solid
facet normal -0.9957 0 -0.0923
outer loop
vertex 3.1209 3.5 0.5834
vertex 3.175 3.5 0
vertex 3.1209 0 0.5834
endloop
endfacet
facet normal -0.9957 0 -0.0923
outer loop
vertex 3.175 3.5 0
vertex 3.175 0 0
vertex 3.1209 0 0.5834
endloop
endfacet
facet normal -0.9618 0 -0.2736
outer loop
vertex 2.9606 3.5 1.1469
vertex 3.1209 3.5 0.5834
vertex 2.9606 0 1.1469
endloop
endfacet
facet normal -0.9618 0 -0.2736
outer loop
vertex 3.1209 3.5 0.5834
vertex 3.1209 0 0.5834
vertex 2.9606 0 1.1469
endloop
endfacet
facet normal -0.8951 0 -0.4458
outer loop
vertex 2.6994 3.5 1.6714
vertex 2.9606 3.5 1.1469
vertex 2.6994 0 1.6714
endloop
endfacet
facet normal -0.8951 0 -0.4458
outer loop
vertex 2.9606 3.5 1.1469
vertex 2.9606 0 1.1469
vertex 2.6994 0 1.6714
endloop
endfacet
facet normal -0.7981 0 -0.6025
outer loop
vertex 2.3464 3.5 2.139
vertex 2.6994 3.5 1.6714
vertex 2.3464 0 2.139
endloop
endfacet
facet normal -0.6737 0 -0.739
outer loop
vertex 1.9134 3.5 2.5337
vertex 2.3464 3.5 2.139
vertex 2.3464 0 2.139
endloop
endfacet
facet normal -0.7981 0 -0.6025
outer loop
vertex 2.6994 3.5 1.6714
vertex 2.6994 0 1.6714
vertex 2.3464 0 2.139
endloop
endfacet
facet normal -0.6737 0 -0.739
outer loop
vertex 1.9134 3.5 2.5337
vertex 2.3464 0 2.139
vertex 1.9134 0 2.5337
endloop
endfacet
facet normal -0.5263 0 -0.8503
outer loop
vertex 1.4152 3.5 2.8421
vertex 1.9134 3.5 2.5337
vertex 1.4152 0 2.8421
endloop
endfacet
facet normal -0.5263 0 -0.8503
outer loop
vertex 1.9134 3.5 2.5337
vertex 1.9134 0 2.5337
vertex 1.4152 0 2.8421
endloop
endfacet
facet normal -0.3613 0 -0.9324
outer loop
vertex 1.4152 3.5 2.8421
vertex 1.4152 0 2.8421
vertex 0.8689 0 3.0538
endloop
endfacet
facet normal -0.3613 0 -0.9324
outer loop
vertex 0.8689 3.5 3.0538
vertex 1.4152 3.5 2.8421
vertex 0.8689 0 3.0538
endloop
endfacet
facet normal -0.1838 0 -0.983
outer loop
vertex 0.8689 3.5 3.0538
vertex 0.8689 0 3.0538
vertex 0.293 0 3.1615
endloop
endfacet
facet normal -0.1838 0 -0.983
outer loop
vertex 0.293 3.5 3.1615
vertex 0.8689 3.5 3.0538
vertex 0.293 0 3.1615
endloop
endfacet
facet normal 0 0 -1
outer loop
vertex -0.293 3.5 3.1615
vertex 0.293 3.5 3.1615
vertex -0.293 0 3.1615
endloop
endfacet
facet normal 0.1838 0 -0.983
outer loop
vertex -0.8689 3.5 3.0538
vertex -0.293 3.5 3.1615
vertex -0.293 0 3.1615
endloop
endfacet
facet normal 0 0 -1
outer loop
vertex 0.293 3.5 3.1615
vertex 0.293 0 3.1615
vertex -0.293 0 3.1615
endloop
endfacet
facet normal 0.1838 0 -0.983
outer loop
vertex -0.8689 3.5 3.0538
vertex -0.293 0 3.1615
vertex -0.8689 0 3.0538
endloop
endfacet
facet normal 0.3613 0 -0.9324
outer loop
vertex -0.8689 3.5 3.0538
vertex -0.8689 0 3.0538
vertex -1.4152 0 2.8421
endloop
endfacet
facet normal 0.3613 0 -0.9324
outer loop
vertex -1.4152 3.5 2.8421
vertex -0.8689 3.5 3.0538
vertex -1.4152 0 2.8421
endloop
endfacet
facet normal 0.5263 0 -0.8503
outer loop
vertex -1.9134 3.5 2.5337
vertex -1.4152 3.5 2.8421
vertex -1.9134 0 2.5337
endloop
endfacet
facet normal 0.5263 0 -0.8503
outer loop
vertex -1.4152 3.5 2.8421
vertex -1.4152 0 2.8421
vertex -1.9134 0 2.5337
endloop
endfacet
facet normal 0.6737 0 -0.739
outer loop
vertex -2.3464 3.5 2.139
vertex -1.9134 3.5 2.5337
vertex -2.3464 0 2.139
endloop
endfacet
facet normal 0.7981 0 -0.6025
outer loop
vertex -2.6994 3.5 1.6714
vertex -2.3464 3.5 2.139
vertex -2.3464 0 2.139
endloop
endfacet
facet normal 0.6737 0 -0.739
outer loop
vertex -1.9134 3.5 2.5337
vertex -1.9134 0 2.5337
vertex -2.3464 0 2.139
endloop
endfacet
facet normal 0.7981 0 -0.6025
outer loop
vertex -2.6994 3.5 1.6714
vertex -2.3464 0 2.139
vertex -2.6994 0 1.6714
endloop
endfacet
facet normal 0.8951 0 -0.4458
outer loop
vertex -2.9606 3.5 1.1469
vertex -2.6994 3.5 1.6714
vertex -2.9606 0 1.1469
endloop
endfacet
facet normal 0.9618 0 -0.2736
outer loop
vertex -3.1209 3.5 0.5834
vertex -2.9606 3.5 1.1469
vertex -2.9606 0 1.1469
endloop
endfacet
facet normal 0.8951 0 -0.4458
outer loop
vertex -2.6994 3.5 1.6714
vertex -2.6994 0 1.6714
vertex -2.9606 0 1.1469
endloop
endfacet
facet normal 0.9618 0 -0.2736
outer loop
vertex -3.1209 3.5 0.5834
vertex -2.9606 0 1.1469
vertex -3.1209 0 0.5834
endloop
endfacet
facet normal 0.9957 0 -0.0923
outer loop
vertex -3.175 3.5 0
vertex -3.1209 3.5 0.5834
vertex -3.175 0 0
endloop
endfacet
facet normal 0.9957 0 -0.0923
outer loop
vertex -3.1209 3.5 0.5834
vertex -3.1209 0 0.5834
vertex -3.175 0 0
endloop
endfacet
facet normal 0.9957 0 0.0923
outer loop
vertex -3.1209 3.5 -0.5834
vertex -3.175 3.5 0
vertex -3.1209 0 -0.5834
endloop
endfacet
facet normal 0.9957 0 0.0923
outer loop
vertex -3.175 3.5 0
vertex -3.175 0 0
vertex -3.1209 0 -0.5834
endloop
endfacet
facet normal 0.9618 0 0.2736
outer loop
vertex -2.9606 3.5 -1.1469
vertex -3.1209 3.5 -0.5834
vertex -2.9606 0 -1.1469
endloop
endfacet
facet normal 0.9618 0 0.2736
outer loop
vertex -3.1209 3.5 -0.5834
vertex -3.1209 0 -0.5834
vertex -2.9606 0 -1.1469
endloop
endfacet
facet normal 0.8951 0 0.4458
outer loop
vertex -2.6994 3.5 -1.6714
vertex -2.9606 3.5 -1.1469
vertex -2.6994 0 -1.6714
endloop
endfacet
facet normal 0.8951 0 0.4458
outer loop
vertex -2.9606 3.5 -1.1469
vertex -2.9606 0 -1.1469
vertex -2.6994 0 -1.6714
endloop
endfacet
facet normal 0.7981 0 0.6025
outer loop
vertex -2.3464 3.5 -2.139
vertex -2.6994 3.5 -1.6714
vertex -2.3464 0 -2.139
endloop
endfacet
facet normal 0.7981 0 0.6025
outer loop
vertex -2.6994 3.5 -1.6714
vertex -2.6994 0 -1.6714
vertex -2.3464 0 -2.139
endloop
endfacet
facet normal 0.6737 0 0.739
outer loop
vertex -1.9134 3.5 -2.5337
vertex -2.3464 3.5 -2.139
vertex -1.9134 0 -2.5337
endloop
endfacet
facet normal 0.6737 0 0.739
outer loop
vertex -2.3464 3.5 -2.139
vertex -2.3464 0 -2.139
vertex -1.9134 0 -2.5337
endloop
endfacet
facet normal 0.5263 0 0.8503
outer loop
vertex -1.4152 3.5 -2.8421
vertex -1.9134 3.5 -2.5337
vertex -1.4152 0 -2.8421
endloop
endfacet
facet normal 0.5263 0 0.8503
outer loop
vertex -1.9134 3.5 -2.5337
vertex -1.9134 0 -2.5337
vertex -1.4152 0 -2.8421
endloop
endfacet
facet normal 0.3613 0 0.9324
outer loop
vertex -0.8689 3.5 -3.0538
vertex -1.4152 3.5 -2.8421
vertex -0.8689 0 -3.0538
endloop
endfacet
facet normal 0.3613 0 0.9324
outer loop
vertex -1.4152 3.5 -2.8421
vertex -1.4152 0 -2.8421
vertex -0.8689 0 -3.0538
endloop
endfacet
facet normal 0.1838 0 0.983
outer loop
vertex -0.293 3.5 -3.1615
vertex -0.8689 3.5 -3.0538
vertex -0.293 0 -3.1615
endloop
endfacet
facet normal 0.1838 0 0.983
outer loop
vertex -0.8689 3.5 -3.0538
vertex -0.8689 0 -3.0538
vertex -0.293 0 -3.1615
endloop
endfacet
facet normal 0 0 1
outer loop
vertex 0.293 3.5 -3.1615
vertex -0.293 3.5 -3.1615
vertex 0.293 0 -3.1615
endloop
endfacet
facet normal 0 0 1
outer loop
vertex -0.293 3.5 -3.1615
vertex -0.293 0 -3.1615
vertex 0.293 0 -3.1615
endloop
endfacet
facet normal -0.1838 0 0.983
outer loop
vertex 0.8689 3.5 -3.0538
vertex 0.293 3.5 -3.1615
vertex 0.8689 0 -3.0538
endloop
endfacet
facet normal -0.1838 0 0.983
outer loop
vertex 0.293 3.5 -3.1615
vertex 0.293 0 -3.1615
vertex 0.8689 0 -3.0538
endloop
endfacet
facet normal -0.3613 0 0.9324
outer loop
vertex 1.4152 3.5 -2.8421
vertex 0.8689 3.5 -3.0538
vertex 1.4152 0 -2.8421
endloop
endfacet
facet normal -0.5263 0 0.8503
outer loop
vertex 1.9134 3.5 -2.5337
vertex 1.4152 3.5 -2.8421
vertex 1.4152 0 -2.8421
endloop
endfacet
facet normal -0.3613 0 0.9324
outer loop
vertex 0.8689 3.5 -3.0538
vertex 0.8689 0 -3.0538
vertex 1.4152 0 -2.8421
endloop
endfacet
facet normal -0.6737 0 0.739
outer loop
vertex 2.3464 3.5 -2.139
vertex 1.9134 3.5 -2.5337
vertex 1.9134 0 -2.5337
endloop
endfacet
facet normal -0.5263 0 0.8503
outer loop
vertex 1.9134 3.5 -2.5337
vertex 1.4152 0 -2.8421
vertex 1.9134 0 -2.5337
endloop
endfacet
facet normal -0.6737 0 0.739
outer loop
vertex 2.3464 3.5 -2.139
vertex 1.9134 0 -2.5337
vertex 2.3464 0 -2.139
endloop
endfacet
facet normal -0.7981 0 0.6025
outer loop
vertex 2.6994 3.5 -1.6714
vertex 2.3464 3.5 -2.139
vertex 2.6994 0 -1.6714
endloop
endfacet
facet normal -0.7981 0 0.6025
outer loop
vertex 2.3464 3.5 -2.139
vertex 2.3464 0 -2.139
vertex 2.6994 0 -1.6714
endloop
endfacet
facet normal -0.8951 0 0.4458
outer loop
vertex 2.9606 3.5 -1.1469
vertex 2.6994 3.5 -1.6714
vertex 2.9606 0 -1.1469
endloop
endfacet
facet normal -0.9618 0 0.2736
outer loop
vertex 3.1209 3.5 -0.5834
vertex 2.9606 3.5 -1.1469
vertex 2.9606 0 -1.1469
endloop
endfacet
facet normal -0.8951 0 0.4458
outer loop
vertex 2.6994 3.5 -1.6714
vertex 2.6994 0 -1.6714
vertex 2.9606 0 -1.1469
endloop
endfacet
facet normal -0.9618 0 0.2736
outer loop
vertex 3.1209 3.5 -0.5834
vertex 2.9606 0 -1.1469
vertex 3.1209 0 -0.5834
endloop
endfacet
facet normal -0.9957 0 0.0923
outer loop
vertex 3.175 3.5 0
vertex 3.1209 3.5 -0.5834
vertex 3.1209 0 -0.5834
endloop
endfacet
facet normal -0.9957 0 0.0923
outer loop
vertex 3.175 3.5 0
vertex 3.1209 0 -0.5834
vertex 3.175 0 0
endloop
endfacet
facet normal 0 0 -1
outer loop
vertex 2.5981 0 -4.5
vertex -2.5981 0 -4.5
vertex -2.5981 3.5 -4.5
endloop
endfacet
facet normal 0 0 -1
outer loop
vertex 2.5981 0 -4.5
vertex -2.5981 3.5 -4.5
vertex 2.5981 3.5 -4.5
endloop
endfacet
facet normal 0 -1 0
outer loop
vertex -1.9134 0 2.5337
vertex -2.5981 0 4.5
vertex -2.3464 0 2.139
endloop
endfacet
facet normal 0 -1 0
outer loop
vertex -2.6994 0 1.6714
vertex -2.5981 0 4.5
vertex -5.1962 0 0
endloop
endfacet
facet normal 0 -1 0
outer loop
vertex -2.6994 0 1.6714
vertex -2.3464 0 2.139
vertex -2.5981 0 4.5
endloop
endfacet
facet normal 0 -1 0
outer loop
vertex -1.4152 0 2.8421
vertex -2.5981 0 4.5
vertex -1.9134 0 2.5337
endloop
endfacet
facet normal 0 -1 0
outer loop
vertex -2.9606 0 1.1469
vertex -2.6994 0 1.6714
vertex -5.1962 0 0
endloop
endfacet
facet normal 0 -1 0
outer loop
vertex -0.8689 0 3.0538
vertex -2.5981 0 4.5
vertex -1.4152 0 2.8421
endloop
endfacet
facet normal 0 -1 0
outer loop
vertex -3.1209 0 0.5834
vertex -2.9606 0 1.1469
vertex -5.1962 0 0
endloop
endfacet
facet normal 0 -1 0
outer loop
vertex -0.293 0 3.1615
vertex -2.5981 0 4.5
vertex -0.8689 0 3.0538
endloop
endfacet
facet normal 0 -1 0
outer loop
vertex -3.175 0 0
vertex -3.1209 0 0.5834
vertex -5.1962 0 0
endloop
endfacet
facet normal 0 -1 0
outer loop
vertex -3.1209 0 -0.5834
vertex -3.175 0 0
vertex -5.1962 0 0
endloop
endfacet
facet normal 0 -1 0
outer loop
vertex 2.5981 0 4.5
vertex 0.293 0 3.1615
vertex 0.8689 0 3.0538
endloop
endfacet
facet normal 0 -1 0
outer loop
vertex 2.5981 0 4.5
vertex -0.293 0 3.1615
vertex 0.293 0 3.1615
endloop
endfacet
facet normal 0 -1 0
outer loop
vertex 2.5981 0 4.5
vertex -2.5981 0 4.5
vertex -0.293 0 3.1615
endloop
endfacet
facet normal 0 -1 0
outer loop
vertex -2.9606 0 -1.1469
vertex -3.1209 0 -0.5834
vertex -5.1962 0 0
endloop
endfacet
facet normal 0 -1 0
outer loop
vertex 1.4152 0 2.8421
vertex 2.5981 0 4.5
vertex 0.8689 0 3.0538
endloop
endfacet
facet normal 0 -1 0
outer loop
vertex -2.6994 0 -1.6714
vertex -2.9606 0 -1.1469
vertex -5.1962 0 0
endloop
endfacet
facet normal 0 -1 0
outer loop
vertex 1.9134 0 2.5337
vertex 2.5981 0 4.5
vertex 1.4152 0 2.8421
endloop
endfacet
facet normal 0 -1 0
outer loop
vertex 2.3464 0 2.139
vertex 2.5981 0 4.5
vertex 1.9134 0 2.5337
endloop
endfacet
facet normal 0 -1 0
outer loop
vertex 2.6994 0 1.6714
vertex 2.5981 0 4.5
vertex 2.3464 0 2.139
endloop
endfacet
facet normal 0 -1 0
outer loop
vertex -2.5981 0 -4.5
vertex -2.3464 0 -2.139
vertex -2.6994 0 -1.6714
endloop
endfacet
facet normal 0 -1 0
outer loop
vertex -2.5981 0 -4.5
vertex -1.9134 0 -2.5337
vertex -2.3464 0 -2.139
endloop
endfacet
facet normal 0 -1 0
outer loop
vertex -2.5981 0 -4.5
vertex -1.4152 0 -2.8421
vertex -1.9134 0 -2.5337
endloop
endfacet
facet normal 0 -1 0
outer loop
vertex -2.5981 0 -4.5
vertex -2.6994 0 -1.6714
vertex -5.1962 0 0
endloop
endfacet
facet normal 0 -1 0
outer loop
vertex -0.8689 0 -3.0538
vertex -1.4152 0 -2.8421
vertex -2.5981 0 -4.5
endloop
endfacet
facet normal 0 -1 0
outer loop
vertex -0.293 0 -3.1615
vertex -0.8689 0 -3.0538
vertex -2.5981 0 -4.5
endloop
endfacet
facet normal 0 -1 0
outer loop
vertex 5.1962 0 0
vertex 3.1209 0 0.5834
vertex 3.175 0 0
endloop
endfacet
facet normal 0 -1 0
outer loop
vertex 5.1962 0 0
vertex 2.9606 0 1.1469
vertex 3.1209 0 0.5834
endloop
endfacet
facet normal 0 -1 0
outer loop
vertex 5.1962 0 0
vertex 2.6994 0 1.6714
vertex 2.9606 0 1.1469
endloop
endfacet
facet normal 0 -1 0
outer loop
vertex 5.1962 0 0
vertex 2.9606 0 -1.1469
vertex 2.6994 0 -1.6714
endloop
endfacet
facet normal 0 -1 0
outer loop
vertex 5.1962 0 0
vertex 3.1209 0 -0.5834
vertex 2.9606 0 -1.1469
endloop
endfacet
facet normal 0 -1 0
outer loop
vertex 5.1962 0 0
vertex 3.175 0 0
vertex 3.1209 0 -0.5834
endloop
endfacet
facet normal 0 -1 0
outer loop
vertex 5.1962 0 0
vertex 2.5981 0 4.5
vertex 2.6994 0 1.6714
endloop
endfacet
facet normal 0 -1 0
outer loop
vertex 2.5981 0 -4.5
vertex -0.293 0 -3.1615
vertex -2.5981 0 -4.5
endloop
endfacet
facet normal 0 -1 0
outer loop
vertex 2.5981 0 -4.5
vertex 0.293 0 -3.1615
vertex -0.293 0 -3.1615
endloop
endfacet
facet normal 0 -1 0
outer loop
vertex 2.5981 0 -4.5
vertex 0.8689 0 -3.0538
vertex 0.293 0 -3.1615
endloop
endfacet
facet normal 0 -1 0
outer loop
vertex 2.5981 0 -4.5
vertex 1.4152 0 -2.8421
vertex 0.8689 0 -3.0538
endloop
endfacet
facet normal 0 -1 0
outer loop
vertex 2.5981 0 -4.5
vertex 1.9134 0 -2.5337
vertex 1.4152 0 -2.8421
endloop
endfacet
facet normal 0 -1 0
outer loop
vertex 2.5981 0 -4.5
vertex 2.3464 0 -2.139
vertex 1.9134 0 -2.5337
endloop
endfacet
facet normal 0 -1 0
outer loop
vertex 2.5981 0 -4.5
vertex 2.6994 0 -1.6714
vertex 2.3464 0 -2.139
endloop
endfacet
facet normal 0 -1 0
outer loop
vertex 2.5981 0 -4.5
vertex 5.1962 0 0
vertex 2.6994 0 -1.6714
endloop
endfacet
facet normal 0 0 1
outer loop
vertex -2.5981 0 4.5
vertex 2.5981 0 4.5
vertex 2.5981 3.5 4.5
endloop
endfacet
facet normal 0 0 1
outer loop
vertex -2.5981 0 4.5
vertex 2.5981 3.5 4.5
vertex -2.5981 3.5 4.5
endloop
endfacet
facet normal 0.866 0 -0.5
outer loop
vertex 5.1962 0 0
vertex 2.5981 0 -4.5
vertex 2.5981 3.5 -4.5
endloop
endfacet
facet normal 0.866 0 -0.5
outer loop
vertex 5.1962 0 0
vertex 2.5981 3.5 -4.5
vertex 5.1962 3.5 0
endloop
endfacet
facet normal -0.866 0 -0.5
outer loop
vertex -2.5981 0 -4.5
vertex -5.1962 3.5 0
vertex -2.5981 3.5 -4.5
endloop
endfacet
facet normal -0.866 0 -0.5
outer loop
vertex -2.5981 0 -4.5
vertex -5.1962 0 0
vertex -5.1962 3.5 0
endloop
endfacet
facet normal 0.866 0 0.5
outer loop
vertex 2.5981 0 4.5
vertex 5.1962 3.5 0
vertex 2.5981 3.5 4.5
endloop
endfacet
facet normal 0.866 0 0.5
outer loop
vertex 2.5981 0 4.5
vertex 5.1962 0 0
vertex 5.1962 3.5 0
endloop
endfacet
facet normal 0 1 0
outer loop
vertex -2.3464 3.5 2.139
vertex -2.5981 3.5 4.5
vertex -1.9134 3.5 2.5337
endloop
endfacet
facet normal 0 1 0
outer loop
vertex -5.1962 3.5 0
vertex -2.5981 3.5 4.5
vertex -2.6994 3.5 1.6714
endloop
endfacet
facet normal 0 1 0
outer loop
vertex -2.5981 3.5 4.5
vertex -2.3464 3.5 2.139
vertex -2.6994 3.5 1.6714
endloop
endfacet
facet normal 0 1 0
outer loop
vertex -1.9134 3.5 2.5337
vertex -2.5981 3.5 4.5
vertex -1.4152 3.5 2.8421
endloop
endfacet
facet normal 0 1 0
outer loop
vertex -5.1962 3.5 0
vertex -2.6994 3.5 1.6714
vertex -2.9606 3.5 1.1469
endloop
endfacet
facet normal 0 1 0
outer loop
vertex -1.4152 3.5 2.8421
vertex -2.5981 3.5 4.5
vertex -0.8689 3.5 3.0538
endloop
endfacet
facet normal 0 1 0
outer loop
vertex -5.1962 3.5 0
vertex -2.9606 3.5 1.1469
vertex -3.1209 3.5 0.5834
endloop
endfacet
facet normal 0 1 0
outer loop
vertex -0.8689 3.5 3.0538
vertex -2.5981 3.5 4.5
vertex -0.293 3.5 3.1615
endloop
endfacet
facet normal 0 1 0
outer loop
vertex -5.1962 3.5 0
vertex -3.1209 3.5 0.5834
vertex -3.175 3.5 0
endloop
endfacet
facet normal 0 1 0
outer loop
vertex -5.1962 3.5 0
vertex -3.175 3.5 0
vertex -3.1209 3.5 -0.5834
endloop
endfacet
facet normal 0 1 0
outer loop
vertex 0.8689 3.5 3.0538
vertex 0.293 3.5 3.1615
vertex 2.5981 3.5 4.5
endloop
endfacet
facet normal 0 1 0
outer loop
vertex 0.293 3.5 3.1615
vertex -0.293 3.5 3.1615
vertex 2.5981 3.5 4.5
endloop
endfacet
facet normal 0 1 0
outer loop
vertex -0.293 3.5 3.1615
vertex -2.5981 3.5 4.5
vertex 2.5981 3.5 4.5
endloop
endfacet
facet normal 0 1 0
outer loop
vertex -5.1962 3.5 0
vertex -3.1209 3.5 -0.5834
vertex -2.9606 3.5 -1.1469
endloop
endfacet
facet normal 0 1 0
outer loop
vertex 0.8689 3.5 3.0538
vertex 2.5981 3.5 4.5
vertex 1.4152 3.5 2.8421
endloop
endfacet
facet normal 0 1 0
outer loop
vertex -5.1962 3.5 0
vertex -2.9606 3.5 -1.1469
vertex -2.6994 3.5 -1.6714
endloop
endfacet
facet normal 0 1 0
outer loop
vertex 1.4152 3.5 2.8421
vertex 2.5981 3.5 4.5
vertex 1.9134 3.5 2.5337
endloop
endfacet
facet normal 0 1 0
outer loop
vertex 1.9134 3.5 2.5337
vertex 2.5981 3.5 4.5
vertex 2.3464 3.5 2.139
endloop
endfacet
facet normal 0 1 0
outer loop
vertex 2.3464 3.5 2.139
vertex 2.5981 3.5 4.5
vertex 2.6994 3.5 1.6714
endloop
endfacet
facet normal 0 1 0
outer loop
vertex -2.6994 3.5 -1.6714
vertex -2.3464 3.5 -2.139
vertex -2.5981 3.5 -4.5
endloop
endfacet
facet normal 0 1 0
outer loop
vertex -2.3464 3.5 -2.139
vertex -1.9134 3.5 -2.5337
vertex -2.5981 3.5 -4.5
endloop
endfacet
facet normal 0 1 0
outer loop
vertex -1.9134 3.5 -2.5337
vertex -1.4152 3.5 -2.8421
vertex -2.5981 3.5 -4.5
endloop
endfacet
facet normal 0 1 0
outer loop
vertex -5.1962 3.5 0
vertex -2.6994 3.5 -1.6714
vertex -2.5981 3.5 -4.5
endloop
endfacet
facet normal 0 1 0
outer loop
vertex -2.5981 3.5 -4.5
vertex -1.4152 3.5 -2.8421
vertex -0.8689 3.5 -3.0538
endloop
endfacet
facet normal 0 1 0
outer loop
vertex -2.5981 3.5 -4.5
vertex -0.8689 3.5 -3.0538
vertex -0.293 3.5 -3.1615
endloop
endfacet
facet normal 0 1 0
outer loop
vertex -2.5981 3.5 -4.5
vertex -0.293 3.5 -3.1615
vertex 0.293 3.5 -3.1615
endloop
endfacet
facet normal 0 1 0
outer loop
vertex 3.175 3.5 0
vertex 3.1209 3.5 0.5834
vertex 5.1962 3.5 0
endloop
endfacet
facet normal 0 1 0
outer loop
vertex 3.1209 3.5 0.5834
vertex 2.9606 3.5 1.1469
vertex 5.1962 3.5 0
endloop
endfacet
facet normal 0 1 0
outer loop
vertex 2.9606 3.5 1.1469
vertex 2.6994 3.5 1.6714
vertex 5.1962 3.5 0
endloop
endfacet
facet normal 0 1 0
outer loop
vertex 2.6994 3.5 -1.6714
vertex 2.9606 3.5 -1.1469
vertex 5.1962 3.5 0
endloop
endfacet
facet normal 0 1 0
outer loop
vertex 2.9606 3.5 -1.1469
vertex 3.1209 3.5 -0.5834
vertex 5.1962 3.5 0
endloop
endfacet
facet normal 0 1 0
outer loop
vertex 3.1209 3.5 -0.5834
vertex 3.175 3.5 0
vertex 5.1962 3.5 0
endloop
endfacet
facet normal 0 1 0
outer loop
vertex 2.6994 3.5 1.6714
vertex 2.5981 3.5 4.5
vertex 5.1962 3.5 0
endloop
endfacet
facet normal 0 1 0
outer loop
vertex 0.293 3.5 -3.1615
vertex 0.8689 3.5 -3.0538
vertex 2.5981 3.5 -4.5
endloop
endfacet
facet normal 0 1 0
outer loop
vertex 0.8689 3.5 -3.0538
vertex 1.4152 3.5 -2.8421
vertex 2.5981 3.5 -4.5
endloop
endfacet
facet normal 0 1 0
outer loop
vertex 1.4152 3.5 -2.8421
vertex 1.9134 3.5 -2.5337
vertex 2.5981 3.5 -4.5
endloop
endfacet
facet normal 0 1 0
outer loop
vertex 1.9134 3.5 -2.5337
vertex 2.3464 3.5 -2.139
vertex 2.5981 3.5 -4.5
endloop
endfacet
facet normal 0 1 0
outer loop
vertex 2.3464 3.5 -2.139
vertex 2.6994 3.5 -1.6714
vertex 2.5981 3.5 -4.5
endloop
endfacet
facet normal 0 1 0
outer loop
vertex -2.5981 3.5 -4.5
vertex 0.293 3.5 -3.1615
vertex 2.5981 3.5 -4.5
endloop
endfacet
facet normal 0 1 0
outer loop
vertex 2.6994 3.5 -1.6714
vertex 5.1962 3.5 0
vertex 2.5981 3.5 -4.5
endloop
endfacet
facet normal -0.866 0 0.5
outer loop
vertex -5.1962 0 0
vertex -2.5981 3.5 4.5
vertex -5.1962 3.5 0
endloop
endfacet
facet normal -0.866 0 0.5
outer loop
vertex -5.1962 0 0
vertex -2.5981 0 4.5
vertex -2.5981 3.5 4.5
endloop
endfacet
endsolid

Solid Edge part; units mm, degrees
sketch "Sketch1" plane through (0, 0, 0) normal (0, -1, 0) x (1, 0, 0)
  circle A0 centre (0, 0) radius 3.175
  line L0 (-2.5981, 4.5) -> (-5.1962, 0)
  line L1 (-5.1962, 0) -> (-2.5981, -4.5)
  line L2 (-2.5981, -4.5) -> (2.5981, -4.5)
  line L3 (2.5981, -4.5) -> (5.1962, 0)
  line L4 (5.1962, 0) -> (2.5981, 4.5)
  line L5 (2.5981, 4.5) -> (-2.5981, 4.5)
extrude "Protrusion1" add sketch "Sketch1" against normal blind 3.5
